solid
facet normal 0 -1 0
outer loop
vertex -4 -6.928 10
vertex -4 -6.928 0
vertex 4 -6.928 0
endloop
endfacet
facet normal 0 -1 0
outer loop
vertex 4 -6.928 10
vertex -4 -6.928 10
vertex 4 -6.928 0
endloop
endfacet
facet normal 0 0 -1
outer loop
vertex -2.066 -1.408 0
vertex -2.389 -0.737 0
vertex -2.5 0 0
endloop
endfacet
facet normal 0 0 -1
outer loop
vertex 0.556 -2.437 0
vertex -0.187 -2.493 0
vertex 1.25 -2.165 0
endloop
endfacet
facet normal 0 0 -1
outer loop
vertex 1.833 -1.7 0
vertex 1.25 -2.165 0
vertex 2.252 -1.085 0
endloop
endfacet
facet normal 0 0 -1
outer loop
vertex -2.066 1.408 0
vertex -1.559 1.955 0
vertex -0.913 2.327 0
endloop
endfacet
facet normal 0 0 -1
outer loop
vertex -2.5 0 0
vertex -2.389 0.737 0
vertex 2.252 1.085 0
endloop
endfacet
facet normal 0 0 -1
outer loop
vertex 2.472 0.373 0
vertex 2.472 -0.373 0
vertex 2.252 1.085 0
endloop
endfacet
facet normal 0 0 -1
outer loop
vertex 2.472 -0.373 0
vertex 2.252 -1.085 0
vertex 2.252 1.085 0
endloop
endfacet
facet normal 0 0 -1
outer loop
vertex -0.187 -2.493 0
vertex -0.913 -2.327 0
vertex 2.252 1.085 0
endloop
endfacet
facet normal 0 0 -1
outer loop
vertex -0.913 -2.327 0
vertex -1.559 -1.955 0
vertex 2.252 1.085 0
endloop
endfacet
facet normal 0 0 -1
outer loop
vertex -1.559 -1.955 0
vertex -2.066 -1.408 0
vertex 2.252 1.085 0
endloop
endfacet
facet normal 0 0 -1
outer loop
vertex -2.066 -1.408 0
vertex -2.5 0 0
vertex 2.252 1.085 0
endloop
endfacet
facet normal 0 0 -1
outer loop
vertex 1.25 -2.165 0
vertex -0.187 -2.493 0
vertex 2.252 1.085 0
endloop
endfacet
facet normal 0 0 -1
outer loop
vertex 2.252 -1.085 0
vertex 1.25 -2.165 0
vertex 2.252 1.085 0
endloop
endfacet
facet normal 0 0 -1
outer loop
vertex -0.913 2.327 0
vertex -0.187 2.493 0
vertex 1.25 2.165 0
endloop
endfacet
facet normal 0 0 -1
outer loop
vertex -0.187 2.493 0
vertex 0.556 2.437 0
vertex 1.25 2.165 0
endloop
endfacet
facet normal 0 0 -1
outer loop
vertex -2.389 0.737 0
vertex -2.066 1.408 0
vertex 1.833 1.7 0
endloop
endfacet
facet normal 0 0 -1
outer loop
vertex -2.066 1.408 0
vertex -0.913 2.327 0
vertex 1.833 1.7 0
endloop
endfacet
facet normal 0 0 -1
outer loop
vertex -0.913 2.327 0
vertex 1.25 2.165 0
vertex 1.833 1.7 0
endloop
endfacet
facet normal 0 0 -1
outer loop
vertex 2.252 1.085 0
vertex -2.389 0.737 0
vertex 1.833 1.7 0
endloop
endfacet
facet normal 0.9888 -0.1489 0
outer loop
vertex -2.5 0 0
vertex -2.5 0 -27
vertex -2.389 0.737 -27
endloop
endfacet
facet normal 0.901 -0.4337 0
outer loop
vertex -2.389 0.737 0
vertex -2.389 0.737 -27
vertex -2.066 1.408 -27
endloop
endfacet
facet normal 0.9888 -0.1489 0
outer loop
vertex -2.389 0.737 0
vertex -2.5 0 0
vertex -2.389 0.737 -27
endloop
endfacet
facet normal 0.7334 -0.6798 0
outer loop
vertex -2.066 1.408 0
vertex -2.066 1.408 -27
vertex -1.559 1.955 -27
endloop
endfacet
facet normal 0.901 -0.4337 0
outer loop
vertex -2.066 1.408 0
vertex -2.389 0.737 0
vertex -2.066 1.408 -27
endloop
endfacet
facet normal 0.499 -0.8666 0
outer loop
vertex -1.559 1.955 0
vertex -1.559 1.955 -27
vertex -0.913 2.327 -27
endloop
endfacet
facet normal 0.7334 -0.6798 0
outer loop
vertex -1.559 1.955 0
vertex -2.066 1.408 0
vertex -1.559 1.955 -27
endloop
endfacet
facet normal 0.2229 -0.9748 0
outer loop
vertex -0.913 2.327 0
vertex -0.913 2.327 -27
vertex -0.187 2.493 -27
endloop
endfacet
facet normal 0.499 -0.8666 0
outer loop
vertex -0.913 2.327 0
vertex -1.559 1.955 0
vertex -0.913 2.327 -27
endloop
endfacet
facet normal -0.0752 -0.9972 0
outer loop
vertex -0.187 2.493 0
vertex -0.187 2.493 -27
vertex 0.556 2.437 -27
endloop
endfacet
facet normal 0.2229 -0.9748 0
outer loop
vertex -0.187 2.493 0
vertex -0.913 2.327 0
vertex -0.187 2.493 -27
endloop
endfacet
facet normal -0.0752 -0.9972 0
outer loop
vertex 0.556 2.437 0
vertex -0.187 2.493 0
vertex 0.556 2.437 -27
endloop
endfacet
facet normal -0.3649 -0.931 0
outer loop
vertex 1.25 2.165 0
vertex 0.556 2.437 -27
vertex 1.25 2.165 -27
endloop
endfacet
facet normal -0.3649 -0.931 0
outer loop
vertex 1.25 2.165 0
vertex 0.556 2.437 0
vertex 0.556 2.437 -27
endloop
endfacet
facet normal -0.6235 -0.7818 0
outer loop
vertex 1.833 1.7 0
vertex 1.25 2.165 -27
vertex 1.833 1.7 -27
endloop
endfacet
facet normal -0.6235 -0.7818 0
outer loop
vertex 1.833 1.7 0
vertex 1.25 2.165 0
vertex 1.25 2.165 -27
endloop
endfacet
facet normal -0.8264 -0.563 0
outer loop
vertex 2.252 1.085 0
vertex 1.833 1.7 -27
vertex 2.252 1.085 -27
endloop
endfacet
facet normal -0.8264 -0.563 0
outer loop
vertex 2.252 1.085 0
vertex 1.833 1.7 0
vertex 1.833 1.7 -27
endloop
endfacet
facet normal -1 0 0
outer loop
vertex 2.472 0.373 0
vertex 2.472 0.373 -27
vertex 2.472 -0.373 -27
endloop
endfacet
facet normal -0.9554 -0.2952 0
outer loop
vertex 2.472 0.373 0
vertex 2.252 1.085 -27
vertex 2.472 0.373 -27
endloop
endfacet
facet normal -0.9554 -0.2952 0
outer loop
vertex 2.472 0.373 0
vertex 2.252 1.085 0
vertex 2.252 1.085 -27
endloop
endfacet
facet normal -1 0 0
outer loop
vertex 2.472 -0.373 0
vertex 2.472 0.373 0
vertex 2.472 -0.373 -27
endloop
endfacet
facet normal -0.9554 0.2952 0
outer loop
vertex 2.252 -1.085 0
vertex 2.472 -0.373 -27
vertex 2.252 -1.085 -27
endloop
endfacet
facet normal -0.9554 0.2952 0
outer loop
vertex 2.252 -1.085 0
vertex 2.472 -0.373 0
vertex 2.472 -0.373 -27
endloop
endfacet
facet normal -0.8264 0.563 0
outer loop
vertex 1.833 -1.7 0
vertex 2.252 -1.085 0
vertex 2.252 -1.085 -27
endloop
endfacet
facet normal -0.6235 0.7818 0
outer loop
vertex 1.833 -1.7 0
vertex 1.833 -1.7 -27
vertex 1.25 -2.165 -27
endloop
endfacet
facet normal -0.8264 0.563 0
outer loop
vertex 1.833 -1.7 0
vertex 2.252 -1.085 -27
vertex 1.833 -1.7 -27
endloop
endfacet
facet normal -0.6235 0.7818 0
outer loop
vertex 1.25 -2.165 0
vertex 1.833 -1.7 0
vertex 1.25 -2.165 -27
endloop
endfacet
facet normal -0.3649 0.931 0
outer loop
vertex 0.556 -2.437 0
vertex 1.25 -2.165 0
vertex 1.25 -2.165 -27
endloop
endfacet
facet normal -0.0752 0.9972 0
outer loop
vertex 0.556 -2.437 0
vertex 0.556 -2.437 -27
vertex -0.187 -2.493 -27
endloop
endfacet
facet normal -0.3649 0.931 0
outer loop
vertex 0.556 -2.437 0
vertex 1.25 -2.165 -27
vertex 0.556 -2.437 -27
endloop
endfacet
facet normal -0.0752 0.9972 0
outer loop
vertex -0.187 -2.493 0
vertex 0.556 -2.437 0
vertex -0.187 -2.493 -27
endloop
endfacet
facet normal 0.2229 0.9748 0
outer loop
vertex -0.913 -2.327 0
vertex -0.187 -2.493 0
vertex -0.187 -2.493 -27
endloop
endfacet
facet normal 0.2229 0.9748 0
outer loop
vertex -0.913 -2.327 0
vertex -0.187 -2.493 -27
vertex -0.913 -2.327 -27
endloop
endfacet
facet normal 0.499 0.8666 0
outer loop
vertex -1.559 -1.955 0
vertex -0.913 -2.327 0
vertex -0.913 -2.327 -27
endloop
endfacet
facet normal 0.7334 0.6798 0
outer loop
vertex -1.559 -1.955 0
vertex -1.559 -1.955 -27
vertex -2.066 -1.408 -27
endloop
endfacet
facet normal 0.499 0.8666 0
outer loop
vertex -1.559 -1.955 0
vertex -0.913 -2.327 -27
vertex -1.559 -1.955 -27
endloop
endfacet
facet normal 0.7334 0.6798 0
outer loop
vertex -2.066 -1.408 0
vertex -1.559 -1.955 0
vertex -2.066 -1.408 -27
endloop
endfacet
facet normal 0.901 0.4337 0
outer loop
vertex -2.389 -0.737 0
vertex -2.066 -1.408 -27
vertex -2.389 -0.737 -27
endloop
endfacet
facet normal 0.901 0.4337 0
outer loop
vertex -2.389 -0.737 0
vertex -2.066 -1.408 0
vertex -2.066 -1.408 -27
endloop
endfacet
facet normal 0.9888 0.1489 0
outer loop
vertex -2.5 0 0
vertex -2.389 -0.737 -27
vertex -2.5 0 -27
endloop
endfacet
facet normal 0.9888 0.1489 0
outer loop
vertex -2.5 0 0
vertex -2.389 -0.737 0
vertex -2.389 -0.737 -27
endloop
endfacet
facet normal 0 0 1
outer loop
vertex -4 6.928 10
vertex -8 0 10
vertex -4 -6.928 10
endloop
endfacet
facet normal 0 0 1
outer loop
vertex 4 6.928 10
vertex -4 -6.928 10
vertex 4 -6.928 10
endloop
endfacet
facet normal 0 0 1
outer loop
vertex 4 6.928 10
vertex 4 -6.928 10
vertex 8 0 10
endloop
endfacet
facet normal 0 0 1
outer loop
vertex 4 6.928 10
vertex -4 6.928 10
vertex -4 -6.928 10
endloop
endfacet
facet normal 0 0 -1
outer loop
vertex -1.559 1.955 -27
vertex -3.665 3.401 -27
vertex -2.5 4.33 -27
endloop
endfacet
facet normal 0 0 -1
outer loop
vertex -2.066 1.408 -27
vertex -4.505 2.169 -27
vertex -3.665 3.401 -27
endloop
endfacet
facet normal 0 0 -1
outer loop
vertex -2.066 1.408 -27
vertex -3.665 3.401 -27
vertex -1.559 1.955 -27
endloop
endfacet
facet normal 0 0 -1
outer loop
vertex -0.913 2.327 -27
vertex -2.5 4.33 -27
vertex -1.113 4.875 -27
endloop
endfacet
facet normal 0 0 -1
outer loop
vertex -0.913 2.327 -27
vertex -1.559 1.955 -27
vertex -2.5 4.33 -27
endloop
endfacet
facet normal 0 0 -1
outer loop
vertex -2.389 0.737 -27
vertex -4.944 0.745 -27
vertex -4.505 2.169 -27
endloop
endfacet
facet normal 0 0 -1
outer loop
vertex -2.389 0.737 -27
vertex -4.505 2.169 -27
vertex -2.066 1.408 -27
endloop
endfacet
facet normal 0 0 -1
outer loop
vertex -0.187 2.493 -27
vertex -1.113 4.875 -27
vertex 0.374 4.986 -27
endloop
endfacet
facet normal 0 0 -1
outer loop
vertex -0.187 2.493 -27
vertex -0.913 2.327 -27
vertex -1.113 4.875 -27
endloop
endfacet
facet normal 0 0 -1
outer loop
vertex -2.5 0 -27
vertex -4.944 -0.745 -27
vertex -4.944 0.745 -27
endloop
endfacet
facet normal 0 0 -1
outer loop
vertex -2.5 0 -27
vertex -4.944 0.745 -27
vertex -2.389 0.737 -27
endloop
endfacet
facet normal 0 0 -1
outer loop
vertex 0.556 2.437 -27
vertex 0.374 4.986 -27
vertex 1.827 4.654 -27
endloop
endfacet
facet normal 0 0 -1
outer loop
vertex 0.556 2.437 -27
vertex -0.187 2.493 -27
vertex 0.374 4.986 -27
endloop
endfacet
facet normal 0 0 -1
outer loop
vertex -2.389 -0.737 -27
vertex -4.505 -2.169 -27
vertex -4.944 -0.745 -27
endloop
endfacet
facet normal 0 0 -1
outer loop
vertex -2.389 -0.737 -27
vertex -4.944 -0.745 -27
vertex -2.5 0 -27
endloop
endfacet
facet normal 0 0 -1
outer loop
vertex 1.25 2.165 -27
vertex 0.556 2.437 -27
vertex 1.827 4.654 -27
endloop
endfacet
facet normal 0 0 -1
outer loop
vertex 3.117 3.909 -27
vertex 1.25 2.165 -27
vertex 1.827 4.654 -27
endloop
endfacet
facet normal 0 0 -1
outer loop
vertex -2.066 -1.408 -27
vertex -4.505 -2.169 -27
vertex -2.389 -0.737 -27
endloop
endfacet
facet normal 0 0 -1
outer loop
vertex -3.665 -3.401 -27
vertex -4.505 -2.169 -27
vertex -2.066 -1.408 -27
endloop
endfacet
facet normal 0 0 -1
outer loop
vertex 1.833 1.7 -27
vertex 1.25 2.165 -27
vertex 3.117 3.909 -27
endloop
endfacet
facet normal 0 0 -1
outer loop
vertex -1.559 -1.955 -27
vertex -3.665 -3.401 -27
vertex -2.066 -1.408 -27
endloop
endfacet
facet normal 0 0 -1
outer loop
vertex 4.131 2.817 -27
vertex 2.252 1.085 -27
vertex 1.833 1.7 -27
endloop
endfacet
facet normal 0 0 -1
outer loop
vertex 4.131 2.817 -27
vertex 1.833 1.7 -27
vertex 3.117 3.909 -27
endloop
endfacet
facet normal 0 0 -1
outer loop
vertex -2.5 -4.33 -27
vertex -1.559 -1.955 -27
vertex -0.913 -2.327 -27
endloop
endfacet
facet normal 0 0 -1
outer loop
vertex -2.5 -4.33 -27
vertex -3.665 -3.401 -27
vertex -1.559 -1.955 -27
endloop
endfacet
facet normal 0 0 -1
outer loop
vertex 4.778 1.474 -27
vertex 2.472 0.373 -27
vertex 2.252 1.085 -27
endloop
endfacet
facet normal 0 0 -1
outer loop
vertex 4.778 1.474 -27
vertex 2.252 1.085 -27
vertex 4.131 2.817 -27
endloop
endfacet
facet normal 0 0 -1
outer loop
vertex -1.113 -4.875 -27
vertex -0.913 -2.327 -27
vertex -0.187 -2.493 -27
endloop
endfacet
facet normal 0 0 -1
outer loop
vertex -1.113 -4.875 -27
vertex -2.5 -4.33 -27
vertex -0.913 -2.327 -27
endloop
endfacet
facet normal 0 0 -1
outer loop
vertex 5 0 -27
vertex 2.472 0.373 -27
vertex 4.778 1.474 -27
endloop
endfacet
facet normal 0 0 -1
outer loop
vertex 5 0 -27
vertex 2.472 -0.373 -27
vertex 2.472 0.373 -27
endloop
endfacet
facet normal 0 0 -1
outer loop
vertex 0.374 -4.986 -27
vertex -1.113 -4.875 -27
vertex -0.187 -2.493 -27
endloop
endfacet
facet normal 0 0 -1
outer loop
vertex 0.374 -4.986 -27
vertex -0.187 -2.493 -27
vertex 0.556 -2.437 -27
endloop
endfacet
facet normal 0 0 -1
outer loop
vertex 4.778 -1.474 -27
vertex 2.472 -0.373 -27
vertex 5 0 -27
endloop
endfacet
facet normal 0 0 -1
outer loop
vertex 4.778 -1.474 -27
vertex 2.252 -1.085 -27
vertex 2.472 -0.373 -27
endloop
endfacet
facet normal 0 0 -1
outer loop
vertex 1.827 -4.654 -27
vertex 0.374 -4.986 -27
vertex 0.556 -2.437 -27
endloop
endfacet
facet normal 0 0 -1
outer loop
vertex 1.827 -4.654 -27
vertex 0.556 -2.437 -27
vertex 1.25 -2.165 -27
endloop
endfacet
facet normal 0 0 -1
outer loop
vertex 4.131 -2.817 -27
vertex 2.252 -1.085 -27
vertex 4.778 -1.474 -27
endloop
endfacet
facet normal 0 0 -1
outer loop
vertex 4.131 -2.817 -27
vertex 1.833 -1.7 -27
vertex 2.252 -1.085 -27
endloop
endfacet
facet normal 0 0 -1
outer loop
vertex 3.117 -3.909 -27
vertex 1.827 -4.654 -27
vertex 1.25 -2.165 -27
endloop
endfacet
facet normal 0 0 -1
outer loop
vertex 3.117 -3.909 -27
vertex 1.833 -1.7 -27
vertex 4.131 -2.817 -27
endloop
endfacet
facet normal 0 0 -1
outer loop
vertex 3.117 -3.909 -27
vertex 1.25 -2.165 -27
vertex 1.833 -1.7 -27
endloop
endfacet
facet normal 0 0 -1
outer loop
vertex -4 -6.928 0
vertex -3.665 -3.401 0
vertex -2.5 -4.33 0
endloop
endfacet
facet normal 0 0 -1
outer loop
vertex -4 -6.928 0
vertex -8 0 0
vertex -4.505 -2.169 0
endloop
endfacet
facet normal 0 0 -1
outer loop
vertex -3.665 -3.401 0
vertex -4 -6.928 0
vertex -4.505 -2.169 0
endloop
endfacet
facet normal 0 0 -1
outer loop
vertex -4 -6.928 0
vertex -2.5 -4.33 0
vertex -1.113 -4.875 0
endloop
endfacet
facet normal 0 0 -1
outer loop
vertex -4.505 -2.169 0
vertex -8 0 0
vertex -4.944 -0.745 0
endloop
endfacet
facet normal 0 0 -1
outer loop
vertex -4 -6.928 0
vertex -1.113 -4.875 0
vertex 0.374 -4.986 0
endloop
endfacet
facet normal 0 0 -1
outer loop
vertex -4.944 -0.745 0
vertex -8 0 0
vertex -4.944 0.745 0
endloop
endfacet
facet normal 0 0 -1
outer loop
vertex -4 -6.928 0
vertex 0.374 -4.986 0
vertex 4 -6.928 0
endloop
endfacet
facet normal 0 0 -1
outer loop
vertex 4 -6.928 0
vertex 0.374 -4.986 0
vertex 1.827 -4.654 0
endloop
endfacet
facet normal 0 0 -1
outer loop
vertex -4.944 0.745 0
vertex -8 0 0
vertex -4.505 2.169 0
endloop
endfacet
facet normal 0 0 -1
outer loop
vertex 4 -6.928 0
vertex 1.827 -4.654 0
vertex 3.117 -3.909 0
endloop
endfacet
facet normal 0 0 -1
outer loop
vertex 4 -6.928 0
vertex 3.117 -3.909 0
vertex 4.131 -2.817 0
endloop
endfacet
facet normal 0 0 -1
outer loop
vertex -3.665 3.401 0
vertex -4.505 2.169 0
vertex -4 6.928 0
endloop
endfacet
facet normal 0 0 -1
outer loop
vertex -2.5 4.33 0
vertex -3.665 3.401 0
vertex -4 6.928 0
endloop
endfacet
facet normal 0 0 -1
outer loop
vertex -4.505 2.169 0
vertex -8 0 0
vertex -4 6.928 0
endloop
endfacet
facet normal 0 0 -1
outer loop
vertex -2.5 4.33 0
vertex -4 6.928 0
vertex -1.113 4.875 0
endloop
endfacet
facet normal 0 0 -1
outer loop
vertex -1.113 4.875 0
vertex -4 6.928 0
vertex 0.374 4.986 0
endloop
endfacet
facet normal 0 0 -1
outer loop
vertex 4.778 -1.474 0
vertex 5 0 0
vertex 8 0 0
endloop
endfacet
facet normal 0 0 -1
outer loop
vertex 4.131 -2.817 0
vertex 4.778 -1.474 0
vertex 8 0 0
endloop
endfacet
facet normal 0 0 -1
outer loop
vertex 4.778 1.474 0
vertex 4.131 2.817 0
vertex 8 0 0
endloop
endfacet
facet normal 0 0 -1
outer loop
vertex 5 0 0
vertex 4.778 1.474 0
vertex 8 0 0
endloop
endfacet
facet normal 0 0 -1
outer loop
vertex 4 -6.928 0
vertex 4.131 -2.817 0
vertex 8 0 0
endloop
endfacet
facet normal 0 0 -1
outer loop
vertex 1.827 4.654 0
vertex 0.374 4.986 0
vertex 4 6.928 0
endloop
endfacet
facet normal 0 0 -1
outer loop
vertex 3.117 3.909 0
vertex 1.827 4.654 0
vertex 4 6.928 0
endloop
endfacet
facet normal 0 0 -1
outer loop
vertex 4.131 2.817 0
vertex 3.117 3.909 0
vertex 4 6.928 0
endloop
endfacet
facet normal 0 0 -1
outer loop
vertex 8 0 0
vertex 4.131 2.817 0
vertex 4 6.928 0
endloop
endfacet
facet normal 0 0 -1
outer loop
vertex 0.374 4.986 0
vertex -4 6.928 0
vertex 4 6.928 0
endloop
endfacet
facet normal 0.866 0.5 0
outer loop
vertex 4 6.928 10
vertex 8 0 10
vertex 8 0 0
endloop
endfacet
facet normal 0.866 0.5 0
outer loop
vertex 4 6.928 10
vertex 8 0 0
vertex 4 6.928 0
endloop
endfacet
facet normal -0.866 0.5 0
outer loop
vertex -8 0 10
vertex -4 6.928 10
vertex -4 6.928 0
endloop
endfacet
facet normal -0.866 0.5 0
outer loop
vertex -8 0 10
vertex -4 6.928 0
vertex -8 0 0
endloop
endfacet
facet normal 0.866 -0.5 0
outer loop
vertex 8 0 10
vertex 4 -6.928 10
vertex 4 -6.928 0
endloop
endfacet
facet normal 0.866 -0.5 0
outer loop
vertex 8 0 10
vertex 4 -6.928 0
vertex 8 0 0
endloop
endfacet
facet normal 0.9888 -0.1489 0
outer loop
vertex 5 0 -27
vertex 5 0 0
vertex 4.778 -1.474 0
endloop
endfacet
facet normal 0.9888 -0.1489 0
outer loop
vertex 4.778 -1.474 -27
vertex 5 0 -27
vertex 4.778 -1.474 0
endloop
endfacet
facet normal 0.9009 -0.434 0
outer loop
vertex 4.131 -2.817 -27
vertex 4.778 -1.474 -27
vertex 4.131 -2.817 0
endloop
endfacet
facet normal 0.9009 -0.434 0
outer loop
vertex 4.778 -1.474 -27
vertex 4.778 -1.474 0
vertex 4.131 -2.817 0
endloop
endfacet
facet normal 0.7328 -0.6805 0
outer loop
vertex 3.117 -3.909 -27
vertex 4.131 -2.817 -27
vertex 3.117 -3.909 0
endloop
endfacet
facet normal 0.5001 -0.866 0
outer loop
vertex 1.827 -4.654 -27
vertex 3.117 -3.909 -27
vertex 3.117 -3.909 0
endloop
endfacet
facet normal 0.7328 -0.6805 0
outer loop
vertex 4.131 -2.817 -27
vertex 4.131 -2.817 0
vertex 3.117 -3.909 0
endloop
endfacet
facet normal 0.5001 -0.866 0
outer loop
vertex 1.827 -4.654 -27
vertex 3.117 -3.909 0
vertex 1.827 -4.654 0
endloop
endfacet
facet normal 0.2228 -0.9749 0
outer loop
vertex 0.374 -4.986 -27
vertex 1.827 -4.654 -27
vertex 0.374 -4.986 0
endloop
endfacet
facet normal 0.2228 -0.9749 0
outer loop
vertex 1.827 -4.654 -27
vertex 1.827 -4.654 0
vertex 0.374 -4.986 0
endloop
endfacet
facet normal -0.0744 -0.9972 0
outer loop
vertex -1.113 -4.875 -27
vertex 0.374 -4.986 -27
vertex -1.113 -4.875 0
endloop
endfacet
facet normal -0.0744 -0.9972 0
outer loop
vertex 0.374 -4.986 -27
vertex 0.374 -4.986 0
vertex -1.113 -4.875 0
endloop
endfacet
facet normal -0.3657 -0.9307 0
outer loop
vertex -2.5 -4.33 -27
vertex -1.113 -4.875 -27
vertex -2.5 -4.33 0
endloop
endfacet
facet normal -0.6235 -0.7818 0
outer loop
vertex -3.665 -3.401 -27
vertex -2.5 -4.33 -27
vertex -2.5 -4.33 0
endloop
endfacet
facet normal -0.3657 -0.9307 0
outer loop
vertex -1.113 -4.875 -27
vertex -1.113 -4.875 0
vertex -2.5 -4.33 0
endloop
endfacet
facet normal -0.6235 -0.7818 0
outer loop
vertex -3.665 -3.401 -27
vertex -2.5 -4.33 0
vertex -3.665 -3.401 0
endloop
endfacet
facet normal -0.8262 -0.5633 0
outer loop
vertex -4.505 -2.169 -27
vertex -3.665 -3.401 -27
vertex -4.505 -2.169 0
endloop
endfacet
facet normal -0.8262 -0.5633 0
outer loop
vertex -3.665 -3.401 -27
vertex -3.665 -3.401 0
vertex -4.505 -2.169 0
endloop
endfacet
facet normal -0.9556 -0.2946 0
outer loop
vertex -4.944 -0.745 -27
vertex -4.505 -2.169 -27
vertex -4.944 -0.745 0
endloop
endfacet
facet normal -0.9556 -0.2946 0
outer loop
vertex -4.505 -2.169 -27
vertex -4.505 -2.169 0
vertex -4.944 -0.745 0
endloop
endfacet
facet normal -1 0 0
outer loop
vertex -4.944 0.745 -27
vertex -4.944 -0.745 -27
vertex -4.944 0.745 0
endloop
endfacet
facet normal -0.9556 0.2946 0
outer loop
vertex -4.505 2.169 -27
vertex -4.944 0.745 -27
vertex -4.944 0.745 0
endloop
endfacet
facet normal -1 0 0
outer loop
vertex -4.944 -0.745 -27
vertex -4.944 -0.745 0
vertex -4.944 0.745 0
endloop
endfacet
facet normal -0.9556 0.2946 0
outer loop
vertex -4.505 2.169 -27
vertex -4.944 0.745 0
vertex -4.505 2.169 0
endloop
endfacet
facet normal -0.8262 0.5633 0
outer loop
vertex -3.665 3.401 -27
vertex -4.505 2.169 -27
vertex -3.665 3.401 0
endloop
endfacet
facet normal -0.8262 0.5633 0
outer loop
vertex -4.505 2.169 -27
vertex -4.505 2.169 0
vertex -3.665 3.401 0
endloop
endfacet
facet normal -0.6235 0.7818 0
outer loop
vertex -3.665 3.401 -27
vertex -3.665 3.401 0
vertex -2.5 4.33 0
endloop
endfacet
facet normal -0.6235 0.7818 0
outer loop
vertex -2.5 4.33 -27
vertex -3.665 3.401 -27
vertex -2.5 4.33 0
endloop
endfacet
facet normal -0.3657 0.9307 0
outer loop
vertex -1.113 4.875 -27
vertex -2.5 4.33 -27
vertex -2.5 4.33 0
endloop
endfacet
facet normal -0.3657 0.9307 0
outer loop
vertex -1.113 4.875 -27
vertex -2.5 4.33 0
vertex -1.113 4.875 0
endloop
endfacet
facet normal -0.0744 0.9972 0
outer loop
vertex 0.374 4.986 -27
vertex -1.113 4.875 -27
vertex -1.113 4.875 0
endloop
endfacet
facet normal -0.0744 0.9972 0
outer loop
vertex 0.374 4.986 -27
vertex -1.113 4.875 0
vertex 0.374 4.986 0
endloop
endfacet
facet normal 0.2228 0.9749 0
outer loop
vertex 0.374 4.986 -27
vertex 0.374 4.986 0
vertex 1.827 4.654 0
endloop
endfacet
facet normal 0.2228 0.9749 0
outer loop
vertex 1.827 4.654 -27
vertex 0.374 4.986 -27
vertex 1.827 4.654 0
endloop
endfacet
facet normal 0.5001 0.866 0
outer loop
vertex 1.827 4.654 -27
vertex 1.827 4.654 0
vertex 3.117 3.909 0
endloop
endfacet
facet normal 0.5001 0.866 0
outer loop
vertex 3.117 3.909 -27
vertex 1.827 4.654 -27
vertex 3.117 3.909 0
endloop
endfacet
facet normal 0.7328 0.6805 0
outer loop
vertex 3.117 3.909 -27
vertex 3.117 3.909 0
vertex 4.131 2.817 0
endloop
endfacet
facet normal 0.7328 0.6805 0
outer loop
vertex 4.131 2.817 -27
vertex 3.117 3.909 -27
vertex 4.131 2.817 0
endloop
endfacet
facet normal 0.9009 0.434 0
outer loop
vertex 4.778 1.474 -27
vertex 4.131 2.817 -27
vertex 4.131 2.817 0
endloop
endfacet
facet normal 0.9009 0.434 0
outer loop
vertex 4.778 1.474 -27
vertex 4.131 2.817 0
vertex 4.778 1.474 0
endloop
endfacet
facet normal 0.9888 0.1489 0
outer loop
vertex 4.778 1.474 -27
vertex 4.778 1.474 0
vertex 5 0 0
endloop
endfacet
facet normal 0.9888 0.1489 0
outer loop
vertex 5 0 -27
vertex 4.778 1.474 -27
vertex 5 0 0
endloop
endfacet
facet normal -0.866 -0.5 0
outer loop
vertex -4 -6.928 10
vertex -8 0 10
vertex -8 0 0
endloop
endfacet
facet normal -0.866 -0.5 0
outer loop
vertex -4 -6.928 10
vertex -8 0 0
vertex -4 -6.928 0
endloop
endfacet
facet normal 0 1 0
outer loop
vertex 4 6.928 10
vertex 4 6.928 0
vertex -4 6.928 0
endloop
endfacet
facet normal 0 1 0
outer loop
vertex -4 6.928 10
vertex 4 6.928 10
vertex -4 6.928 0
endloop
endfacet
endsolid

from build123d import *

# Parameters (mm, degrees)
EXTRUDE_1_DEPTH     = 10
SKETCH_3_R          = 4.5
SKETCH_3_R_2        = 2.5
EXTRUDE_2_DEPTH     = 120
SKETCH_4_R          = 1.5
CUT_EXTRUDE_1_DEPTH = 20
SKETCH_5_R          = 5
SKETCH_5_R_2        = 4.5
EXTRUDE_3_DEPTH     = 45
CUT_EXTRUDE_START   = -75
SKETCH_6_R          = 4.5
CUT_EXTRUDE_2_DEPTH = 75
CUT_EXTRUDE_START_2 = -18
SKETCH_7_R          = 5
CUT_EXTRUDE_3_DEPTH = 18


with BuildPart() as part:
    # 草图1 → 凸台-拉伸1 (new body)
    with BuildSketch(Plane.XY):
        Polygon((8, 0), (4, 6.92820323), (-4, 6.92820323), (-8, 0), (-4, -6.92820323), (4, -6.92820323), align=None)
    extrude(amount=EXTRUDE_1_DEPTH)

    # 草图3 → 凸台-拉伸2 (add)
    with BuildSketch(Plane(origin=(0, 0, 0), x_dir=(-1, 0, 0), z_dir=(0, 0, -1))):
        with Locations(Location((0, 0, 0), (0, 0, 180))):
            Circle(SKETCH_3_R)
        Circle(SKETCH_3_R_2, mode=Mode.SUBTRACT)
    extrude(amount=EXTRUDE_2_DEPTH)

    # 草图4 → 切除-拉伸1 (cut)
    with BuildSketch(Plane(origin=(0, 0, 0), x_dir=(1, 0, 0), z_dir=(0, 1, 0))):
        with Locations(Location((0, 110, 0), (0, 0, 270))):
            Circle(SKETCH_4_R)
    extrude(amount=-CUT_EXTRUDE_1_DEPTH, mode=Mode.SUBTRACT)

    # 草图5 → 凸台-拉伸3 (add)
    with BuildSketch(Plane(origin=(0, 0, 0), x_dir=(-1, 0, 0), z_dir=(0, 0, -1))):
        with Locations(Location((0, 0, 0), (0, 0, 180))):
            Circle(SKETCH_5_R)
        Circle(SKETCH_5_R_2, mode=Mode.SUBTRACT)
    extrude(amount=EXTRUDE_3_DEPTH)

    # 草图6 → 切除-拉伸2 (cut)
    with BuildSketch(Plane(origin=(0, 0, -120), x_dir=(-1, 0, 0), z_dir=(0, 0, -1)).offset(CUT_EXTRUDE_START)):
        Circle(SKETCH_6_R)
    extrude(amount=CUT_EXTRUDE_2_DEPTH, mode=Mode.SUBTRACT)

    # 草图7 → 切除-拉伸3 (cut)
    with BuildSketch(Plane(origin=(0, 0, -45), x_dir=(-1, 0, 0), z_dir=(0, 0, -1)).offset(CUT_EXTRUDE_START_2)):
        with Locations(Location((0, 0, 0), (0, 0, 180))):
            Circle(SKETCH_7_R)
    extrude(amount=CUT_EXTRUDE_3_DEPTH, mode=Mode.SUBTRACT)


solid = part.part
